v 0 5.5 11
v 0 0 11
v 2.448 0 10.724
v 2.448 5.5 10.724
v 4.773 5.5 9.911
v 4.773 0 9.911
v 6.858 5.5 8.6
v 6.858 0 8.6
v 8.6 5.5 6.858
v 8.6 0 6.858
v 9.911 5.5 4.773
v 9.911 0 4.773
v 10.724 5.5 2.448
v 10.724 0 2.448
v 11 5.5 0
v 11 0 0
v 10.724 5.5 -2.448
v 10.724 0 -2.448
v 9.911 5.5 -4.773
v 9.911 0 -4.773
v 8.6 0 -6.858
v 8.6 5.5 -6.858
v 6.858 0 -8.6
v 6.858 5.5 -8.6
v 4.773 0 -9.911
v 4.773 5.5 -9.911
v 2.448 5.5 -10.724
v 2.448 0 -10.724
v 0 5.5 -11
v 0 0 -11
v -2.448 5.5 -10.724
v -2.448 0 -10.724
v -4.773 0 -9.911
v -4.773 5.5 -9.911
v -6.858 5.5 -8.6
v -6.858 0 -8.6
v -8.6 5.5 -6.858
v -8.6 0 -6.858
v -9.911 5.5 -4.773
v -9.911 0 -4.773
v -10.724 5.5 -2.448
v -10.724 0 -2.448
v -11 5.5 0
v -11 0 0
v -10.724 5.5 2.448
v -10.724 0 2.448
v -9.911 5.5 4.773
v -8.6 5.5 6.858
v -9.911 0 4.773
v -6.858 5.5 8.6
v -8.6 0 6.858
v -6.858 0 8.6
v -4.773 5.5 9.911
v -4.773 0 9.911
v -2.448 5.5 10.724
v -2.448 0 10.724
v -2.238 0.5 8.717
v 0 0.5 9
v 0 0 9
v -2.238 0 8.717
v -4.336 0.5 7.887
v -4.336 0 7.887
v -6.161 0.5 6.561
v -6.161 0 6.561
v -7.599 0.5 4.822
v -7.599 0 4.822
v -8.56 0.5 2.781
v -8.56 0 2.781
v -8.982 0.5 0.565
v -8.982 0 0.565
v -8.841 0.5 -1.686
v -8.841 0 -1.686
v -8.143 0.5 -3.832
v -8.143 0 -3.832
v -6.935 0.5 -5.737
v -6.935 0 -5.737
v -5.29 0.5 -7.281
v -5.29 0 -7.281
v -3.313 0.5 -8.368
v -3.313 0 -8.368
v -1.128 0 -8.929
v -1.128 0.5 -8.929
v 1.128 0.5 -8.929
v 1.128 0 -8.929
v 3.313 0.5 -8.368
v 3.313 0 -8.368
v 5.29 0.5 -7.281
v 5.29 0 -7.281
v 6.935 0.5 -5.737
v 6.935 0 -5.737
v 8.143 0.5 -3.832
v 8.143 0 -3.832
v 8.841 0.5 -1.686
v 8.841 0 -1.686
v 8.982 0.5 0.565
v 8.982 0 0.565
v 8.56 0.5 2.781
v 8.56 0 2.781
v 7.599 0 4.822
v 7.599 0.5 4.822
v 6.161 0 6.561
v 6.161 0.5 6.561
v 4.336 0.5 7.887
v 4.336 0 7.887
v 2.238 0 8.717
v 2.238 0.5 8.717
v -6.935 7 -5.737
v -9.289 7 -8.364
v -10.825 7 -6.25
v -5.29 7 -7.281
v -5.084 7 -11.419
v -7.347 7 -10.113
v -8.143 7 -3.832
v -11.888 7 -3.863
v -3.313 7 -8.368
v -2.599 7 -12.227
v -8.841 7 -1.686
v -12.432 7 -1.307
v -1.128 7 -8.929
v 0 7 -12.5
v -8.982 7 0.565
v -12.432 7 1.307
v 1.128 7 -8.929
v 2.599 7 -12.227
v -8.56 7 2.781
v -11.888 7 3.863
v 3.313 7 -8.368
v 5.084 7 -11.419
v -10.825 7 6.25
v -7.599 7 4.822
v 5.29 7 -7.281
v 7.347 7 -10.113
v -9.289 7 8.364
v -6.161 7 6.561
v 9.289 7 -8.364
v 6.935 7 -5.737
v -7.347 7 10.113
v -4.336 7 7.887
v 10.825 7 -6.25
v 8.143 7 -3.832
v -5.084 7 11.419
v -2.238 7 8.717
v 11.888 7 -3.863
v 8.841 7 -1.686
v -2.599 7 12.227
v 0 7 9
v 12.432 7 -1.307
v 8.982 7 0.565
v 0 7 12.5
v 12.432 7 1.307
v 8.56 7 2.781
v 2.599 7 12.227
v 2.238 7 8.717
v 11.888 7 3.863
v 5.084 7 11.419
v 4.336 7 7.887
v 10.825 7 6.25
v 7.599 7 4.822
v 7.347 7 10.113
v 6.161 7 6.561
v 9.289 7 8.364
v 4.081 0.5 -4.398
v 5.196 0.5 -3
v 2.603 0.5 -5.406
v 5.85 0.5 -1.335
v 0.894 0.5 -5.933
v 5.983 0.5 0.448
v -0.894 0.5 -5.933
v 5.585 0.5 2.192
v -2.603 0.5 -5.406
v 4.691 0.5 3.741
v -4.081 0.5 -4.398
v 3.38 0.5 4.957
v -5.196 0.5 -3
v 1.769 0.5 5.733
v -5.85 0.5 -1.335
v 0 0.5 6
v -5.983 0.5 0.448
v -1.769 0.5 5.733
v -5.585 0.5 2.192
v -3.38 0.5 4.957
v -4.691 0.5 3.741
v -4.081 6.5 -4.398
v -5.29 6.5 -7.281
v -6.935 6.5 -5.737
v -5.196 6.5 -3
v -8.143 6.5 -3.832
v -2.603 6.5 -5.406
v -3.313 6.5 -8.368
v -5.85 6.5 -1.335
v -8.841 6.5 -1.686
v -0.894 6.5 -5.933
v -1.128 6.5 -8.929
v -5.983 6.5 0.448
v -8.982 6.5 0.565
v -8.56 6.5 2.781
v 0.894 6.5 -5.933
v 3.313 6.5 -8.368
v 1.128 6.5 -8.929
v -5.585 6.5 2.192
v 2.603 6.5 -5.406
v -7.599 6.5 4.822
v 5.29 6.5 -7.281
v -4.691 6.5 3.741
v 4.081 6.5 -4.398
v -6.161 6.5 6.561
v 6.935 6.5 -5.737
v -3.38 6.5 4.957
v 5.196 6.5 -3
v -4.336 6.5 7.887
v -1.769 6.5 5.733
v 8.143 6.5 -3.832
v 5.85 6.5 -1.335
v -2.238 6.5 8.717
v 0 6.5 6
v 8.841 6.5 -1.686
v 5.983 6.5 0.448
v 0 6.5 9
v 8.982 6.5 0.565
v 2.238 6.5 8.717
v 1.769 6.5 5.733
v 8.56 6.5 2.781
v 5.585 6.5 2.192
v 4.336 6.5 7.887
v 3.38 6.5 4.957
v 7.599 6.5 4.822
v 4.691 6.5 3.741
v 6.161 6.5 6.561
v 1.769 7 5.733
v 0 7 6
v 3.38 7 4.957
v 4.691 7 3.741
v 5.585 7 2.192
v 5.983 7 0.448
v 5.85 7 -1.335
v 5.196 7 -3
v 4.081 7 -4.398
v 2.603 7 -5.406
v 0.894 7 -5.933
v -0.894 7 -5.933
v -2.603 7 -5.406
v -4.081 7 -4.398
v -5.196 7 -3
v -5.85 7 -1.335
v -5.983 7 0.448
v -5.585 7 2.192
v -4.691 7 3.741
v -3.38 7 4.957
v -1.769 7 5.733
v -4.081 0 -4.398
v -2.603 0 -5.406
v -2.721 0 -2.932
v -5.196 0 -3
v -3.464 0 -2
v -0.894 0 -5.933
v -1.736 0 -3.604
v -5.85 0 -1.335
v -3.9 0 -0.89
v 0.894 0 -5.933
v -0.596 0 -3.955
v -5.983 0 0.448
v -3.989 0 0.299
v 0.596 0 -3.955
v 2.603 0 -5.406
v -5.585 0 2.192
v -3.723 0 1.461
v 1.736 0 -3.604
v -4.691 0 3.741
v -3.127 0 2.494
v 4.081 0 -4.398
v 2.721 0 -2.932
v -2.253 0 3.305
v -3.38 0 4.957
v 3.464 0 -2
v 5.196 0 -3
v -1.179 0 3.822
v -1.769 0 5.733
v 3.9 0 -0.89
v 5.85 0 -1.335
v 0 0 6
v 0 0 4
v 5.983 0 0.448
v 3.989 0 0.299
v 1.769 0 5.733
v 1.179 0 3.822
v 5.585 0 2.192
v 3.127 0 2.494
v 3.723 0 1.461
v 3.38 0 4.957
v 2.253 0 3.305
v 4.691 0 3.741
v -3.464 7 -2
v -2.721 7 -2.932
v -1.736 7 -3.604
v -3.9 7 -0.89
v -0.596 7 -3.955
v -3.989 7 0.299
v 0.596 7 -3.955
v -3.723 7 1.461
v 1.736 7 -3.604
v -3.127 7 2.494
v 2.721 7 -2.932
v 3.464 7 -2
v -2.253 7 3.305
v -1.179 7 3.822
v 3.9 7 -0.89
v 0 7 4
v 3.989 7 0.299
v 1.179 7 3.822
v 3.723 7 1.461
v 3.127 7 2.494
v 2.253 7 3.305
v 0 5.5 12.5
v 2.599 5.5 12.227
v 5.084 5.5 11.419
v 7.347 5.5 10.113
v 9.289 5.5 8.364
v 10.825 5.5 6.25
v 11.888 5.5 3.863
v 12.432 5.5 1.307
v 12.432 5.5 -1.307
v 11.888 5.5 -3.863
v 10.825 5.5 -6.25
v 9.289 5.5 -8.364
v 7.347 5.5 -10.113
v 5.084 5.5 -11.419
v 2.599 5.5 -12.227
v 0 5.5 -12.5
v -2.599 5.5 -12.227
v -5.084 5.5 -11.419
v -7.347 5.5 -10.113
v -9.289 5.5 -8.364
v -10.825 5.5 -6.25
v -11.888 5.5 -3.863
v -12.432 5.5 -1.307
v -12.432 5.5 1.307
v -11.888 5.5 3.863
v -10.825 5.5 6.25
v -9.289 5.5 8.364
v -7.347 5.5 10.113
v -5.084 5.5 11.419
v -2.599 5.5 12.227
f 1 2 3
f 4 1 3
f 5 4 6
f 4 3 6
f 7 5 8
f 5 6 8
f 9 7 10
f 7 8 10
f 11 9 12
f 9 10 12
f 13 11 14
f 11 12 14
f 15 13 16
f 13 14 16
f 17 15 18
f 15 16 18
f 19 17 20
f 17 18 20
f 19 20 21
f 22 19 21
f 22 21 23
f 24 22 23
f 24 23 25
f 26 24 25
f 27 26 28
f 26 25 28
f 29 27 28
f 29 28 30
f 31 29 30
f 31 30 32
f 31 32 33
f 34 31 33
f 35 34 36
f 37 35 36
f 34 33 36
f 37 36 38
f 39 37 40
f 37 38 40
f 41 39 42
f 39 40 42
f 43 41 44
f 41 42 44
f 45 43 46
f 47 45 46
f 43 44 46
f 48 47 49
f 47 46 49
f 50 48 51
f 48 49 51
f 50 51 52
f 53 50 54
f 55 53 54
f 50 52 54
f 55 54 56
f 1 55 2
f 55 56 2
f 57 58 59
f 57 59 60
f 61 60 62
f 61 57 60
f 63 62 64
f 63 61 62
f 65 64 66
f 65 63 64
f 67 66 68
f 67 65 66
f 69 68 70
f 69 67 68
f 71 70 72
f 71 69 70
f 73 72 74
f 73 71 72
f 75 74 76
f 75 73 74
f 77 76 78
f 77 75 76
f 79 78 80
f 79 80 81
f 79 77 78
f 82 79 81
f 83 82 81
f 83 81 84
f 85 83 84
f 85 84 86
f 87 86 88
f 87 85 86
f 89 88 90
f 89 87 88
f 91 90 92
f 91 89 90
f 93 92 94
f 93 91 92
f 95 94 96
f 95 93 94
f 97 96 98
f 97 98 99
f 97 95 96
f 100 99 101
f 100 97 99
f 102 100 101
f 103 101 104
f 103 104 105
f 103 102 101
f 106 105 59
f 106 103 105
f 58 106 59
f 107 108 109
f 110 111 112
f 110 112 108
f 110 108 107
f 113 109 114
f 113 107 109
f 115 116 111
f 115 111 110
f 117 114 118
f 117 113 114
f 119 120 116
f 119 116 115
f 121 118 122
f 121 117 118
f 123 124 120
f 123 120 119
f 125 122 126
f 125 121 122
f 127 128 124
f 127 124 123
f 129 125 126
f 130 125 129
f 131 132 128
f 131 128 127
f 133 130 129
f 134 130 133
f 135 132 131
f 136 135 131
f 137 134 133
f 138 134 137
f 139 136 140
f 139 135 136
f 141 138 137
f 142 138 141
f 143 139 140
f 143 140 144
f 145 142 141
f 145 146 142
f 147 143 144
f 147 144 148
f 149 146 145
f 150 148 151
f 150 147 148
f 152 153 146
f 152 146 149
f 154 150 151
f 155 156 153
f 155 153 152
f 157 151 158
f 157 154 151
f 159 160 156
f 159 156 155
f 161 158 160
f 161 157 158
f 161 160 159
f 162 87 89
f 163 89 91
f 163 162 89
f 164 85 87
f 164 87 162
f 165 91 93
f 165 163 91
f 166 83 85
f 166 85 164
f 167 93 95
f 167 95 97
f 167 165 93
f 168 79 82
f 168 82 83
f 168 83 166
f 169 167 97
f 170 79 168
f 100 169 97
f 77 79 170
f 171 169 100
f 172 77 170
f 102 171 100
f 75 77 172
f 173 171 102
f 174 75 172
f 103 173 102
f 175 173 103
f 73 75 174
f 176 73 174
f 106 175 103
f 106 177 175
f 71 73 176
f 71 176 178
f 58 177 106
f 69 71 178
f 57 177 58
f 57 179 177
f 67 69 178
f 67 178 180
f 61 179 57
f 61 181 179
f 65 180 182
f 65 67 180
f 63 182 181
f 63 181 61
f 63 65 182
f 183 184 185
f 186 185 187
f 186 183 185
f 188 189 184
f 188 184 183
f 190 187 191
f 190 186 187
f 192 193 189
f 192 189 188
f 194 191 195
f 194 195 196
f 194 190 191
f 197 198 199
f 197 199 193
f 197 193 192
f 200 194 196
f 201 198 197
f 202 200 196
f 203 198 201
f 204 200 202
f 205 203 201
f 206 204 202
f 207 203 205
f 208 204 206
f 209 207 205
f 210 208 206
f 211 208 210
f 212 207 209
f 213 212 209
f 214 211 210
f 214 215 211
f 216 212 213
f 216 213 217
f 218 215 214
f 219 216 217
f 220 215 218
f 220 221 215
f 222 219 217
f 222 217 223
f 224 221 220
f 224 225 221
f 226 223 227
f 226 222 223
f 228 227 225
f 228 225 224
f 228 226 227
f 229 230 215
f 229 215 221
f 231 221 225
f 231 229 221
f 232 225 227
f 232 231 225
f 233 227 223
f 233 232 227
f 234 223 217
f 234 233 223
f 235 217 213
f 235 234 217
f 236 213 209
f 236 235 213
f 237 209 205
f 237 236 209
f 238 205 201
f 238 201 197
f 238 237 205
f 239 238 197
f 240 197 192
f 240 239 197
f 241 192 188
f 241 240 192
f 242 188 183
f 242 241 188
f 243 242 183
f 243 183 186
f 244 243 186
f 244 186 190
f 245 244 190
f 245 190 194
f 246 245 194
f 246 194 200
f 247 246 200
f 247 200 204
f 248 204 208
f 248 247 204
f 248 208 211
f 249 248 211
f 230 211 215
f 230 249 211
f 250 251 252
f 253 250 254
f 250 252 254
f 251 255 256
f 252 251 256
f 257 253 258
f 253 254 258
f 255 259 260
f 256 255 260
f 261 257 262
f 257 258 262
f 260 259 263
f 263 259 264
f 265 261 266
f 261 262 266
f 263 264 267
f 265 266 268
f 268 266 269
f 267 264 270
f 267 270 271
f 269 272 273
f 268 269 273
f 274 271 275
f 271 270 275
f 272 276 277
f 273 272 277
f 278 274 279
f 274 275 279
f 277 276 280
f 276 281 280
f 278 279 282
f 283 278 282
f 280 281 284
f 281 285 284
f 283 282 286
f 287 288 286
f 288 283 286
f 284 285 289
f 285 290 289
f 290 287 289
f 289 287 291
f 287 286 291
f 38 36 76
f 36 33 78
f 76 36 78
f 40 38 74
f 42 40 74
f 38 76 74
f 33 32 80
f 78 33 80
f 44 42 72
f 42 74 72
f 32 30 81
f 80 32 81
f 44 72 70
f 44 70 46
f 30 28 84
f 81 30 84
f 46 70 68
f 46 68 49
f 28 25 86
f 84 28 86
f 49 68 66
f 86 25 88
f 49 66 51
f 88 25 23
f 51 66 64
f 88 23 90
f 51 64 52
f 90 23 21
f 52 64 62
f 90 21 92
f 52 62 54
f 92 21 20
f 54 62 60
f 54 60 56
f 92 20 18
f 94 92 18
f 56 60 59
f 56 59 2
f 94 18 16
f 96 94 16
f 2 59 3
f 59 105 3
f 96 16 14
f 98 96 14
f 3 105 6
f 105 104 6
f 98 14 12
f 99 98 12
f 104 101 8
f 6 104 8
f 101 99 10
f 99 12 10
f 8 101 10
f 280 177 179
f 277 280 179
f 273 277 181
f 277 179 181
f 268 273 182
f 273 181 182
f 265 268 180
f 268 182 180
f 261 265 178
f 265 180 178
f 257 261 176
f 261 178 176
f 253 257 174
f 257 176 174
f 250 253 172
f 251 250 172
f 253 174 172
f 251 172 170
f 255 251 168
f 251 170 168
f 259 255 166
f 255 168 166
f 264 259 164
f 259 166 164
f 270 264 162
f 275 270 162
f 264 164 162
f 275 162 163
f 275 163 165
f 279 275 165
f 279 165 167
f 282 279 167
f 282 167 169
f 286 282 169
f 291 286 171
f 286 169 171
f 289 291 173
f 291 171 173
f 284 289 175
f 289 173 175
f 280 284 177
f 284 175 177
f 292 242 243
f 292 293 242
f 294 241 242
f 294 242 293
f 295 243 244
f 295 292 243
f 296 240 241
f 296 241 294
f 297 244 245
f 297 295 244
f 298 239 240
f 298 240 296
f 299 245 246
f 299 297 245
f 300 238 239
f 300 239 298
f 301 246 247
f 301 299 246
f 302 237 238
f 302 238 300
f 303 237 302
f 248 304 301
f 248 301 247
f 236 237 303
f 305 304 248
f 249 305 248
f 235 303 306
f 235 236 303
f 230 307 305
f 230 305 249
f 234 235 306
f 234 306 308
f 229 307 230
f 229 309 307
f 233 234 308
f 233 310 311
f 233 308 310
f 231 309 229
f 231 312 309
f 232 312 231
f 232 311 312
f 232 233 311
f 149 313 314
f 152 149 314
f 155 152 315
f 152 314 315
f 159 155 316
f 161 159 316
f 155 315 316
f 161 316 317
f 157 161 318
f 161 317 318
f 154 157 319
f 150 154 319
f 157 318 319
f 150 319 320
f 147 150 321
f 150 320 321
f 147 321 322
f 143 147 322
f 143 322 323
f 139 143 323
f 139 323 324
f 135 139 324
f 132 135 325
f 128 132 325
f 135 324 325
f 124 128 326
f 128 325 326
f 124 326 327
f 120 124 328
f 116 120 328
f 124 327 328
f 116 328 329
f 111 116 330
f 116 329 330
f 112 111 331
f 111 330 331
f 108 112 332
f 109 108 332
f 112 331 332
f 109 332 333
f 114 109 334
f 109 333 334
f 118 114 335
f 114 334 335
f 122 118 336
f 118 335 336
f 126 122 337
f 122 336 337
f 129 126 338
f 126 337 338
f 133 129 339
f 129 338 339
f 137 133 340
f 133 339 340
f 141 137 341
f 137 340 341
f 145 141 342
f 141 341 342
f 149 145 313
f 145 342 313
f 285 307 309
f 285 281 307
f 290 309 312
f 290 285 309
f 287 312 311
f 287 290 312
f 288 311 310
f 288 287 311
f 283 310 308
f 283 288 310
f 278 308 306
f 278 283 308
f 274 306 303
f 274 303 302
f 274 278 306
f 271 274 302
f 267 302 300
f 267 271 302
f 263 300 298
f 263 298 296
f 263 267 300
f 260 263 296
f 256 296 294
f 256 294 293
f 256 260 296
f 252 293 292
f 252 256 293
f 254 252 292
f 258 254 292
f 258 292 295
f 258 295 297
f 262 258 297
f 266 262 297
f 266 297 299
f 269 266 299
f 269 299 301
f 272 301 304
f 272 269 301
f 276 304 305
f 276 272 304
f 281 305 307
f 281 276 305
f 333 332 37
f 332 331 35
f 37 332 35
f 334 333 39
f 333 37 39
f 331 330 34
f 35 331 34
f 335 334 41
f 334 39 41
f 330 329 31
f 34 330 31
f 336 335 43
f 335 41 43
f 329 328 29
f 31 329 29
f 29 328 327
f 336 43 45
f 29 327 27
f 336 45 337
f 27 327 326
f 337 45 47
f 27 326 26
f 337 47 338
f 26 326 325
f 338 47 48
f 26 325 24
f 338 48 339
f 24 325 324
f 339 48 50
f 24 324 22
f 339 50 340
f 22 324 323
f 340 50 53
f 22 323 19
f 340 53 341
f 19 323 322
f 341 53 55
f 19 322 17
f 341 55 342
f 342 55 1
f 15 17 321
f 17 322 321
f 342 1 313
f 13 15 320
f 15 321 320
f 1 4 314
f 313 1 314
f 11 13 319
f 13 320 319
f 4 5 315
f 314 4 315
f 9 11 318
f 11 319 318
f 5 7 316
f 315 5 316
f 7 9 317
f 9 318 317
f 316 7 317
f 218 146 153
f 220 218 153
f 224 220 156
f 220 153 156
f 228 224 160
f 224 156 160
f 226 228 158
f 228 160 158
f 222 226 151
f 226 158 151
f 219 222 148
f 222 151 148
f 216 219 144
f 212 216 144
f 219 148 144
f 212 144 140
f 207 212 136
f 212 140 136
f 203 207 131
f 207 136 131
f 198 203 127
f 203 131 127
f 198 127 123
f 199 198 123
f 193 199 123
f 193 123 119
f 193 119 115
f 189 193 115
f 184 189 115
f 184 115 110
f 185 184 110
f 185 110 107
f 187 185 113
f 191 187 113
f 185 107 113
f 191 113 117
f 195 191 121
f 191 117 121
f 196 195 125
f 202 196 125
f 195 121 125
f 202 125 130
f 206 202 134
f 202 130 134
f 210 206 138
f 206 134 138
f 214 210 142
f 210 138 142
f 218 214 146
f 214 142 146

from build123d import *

# Parameters (mm, degrees)
SKETCH1_R           = 11
SKETCH1_R_2         = 4
BOSS_EXTRUDE1_DEPTH = 5.5
SKETCH2_R           = 12.5
SKETCH2_R_2         = 4
BOSS_EXTRUDE2_DEPTH = 1.5
SKETCH3_R           = 9
SKETCH3_R_2         = 6
CUT_EXTRUDE1_DEPTH  = 0.5
CUT_EXTRUDE2_START  = -0.5
SKETCH4_R           = 9
SKETCH4_R_2         = 6
CUT_EXTRUDE2_DEPTH  = 0.5


with BuildPart() as part:
    # Sketch1 → Boss-Extrude1 (new body)
    with BuildSketch(Plane(origin=(0, 0, 0), x_dir=(1, 0, 0), z_dir=(0, 1, 0))):
        with Locations(Location((0, 0, 0), (0, 0, 270))):
            Circle(SKETCH1_R)
        with Locations(Location((0, 0, 0), (0, 0, 270))):
            Circle(SKETCH1_R_2, mode=Mode.SUBTRACT)
    extrude(amount=BOSS_EXTRUDE1_DEPTH)

    # Sketch2 → Boss-Extrude2 (add)
    with BuildSketch(Plane(origin=(0, 5.5, 0), x_dir=(1, 0, 0), z_dir=(0, 1, 0))):
        with Locations(Location((0, 0, 0), (0, 0, 270))):
            Circle(SKETCH2_R)
        with Locations(Location((0, 0, 0), (0, 0, 270))):
            Circle(SKETCH2_R_2, mode=Mode.SUBTRACT)
    extrude(amount=BOSS_EXTRUDE2_DEPTH)

    # Sketch3 → Cut-Extrude1 (cut)
    with BuildSketch(Plane(origin=(0, 7, 0), x_dir=(1, 0, 0), z_dir=(0, 1, 0))):
        with Locations(Location((0, 0, 0), (0, 0, 270))):
            Circle(SKETCH3_R)
        with Locations(Location((0, 0, 0), (0, 0, 270))):
            Circle(SKETCH3_R_2, mode=Mode.SUBTRACT)
    extrude(amount=-CUT_EXTRUDE1_DEPTH, mode=Mode.SUBTRACT)

    # Sketch4 → Cut-Extrude2 (cut)
    with BuildSketch(Plane.XZ.offset(CUT_EXTRUDE2_START)):
        with Locations(Location((0, 0, 0), (0, 0, 90))):
            Circle(SKETCH4_R)
        with Locations(Location((0, 0, 0), (0, 0, 90))):
            Circle(SKETCH4_R_2, mode=Mode.SUBTRACT)
    extrude(amount=CUT_EXTRUDE2_DEPTH, mode=Mode.SUBTRACT)


solid = part.part
